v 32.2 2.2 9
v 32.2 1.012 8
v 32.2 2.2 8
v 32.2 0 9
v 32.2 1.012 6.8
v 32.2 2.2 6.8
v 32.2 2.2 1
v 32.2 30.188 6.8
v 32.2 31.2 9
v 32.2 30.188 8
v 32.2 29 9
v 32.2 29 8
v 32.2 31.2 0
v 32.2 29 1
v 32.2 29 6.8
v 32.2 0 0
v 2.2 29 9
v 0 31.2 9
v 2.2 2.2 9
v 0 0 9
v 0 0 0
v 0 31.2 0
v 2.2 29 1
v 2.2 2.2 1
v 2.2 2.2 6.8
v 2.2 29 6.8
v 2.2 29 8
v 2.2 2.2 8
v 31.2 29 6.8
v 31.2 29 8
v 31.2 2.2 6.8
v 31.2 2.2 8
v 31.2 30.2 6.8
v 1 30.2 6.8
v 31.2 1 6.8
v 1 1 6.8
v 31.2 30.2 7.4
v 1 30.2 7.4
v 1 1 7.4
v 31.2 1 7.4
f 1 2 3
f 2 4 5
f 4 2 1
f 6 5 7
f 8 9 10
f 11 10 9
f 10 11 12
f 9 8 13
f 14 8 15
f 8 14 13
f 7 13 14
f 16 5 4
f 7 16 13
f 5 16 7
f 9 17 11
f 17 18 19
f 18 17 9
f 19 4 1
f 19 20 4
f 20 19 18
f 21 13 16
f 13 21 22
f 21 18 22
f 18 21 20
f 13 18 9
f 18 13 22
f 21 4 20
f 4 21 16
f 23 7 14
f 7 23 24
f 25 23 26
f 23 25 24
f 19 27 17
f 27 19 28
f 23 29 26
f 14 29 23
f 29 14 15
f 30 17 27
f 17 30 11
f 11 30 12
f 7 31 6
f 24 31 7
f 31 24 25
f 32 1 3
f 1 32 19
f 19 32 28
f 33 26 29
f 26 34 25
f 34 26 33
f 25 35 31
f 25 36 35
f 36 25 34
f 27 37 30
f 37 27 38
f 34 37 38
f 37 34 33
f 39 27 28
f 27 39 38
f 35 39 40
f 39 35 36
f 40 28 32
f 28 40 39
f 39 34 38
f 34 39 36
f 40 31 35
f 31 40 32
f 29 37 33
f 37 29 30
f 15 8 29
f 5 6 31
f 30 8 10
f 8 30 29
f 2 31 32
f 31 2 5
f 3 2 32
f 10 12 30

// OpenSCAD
margin = 0.1;

l = 30 + 2*margin;
w = 29 + 2*margin;
d = 7;
slit = 1 + 2*margin;
thickness = 1;

module box(t=thickness) {
    L = l + 2*t;
    W = w + 2*t;
    H = d + 2*t;

    difference() {
        cube([L,W,H]);
        translate([t+slit,t+slit,t]) cube([L,w-2*slit,H]);
        hull() {
            translate([t,t,t+d-slit]) cube([l,w,slit/2]);
            translate([t+slit,t+slit,t+d-slit]) cube([l-slit,w-2*slit,slit]);
        }
        hull() {
            translate([t+l,t+slit,t+d-slit]) cube([.01,w-2*slit,slit]);
            translate([L+.01,t,t+d-slit]) cube([.01,w,slit]);
        }

    }
}
box();
